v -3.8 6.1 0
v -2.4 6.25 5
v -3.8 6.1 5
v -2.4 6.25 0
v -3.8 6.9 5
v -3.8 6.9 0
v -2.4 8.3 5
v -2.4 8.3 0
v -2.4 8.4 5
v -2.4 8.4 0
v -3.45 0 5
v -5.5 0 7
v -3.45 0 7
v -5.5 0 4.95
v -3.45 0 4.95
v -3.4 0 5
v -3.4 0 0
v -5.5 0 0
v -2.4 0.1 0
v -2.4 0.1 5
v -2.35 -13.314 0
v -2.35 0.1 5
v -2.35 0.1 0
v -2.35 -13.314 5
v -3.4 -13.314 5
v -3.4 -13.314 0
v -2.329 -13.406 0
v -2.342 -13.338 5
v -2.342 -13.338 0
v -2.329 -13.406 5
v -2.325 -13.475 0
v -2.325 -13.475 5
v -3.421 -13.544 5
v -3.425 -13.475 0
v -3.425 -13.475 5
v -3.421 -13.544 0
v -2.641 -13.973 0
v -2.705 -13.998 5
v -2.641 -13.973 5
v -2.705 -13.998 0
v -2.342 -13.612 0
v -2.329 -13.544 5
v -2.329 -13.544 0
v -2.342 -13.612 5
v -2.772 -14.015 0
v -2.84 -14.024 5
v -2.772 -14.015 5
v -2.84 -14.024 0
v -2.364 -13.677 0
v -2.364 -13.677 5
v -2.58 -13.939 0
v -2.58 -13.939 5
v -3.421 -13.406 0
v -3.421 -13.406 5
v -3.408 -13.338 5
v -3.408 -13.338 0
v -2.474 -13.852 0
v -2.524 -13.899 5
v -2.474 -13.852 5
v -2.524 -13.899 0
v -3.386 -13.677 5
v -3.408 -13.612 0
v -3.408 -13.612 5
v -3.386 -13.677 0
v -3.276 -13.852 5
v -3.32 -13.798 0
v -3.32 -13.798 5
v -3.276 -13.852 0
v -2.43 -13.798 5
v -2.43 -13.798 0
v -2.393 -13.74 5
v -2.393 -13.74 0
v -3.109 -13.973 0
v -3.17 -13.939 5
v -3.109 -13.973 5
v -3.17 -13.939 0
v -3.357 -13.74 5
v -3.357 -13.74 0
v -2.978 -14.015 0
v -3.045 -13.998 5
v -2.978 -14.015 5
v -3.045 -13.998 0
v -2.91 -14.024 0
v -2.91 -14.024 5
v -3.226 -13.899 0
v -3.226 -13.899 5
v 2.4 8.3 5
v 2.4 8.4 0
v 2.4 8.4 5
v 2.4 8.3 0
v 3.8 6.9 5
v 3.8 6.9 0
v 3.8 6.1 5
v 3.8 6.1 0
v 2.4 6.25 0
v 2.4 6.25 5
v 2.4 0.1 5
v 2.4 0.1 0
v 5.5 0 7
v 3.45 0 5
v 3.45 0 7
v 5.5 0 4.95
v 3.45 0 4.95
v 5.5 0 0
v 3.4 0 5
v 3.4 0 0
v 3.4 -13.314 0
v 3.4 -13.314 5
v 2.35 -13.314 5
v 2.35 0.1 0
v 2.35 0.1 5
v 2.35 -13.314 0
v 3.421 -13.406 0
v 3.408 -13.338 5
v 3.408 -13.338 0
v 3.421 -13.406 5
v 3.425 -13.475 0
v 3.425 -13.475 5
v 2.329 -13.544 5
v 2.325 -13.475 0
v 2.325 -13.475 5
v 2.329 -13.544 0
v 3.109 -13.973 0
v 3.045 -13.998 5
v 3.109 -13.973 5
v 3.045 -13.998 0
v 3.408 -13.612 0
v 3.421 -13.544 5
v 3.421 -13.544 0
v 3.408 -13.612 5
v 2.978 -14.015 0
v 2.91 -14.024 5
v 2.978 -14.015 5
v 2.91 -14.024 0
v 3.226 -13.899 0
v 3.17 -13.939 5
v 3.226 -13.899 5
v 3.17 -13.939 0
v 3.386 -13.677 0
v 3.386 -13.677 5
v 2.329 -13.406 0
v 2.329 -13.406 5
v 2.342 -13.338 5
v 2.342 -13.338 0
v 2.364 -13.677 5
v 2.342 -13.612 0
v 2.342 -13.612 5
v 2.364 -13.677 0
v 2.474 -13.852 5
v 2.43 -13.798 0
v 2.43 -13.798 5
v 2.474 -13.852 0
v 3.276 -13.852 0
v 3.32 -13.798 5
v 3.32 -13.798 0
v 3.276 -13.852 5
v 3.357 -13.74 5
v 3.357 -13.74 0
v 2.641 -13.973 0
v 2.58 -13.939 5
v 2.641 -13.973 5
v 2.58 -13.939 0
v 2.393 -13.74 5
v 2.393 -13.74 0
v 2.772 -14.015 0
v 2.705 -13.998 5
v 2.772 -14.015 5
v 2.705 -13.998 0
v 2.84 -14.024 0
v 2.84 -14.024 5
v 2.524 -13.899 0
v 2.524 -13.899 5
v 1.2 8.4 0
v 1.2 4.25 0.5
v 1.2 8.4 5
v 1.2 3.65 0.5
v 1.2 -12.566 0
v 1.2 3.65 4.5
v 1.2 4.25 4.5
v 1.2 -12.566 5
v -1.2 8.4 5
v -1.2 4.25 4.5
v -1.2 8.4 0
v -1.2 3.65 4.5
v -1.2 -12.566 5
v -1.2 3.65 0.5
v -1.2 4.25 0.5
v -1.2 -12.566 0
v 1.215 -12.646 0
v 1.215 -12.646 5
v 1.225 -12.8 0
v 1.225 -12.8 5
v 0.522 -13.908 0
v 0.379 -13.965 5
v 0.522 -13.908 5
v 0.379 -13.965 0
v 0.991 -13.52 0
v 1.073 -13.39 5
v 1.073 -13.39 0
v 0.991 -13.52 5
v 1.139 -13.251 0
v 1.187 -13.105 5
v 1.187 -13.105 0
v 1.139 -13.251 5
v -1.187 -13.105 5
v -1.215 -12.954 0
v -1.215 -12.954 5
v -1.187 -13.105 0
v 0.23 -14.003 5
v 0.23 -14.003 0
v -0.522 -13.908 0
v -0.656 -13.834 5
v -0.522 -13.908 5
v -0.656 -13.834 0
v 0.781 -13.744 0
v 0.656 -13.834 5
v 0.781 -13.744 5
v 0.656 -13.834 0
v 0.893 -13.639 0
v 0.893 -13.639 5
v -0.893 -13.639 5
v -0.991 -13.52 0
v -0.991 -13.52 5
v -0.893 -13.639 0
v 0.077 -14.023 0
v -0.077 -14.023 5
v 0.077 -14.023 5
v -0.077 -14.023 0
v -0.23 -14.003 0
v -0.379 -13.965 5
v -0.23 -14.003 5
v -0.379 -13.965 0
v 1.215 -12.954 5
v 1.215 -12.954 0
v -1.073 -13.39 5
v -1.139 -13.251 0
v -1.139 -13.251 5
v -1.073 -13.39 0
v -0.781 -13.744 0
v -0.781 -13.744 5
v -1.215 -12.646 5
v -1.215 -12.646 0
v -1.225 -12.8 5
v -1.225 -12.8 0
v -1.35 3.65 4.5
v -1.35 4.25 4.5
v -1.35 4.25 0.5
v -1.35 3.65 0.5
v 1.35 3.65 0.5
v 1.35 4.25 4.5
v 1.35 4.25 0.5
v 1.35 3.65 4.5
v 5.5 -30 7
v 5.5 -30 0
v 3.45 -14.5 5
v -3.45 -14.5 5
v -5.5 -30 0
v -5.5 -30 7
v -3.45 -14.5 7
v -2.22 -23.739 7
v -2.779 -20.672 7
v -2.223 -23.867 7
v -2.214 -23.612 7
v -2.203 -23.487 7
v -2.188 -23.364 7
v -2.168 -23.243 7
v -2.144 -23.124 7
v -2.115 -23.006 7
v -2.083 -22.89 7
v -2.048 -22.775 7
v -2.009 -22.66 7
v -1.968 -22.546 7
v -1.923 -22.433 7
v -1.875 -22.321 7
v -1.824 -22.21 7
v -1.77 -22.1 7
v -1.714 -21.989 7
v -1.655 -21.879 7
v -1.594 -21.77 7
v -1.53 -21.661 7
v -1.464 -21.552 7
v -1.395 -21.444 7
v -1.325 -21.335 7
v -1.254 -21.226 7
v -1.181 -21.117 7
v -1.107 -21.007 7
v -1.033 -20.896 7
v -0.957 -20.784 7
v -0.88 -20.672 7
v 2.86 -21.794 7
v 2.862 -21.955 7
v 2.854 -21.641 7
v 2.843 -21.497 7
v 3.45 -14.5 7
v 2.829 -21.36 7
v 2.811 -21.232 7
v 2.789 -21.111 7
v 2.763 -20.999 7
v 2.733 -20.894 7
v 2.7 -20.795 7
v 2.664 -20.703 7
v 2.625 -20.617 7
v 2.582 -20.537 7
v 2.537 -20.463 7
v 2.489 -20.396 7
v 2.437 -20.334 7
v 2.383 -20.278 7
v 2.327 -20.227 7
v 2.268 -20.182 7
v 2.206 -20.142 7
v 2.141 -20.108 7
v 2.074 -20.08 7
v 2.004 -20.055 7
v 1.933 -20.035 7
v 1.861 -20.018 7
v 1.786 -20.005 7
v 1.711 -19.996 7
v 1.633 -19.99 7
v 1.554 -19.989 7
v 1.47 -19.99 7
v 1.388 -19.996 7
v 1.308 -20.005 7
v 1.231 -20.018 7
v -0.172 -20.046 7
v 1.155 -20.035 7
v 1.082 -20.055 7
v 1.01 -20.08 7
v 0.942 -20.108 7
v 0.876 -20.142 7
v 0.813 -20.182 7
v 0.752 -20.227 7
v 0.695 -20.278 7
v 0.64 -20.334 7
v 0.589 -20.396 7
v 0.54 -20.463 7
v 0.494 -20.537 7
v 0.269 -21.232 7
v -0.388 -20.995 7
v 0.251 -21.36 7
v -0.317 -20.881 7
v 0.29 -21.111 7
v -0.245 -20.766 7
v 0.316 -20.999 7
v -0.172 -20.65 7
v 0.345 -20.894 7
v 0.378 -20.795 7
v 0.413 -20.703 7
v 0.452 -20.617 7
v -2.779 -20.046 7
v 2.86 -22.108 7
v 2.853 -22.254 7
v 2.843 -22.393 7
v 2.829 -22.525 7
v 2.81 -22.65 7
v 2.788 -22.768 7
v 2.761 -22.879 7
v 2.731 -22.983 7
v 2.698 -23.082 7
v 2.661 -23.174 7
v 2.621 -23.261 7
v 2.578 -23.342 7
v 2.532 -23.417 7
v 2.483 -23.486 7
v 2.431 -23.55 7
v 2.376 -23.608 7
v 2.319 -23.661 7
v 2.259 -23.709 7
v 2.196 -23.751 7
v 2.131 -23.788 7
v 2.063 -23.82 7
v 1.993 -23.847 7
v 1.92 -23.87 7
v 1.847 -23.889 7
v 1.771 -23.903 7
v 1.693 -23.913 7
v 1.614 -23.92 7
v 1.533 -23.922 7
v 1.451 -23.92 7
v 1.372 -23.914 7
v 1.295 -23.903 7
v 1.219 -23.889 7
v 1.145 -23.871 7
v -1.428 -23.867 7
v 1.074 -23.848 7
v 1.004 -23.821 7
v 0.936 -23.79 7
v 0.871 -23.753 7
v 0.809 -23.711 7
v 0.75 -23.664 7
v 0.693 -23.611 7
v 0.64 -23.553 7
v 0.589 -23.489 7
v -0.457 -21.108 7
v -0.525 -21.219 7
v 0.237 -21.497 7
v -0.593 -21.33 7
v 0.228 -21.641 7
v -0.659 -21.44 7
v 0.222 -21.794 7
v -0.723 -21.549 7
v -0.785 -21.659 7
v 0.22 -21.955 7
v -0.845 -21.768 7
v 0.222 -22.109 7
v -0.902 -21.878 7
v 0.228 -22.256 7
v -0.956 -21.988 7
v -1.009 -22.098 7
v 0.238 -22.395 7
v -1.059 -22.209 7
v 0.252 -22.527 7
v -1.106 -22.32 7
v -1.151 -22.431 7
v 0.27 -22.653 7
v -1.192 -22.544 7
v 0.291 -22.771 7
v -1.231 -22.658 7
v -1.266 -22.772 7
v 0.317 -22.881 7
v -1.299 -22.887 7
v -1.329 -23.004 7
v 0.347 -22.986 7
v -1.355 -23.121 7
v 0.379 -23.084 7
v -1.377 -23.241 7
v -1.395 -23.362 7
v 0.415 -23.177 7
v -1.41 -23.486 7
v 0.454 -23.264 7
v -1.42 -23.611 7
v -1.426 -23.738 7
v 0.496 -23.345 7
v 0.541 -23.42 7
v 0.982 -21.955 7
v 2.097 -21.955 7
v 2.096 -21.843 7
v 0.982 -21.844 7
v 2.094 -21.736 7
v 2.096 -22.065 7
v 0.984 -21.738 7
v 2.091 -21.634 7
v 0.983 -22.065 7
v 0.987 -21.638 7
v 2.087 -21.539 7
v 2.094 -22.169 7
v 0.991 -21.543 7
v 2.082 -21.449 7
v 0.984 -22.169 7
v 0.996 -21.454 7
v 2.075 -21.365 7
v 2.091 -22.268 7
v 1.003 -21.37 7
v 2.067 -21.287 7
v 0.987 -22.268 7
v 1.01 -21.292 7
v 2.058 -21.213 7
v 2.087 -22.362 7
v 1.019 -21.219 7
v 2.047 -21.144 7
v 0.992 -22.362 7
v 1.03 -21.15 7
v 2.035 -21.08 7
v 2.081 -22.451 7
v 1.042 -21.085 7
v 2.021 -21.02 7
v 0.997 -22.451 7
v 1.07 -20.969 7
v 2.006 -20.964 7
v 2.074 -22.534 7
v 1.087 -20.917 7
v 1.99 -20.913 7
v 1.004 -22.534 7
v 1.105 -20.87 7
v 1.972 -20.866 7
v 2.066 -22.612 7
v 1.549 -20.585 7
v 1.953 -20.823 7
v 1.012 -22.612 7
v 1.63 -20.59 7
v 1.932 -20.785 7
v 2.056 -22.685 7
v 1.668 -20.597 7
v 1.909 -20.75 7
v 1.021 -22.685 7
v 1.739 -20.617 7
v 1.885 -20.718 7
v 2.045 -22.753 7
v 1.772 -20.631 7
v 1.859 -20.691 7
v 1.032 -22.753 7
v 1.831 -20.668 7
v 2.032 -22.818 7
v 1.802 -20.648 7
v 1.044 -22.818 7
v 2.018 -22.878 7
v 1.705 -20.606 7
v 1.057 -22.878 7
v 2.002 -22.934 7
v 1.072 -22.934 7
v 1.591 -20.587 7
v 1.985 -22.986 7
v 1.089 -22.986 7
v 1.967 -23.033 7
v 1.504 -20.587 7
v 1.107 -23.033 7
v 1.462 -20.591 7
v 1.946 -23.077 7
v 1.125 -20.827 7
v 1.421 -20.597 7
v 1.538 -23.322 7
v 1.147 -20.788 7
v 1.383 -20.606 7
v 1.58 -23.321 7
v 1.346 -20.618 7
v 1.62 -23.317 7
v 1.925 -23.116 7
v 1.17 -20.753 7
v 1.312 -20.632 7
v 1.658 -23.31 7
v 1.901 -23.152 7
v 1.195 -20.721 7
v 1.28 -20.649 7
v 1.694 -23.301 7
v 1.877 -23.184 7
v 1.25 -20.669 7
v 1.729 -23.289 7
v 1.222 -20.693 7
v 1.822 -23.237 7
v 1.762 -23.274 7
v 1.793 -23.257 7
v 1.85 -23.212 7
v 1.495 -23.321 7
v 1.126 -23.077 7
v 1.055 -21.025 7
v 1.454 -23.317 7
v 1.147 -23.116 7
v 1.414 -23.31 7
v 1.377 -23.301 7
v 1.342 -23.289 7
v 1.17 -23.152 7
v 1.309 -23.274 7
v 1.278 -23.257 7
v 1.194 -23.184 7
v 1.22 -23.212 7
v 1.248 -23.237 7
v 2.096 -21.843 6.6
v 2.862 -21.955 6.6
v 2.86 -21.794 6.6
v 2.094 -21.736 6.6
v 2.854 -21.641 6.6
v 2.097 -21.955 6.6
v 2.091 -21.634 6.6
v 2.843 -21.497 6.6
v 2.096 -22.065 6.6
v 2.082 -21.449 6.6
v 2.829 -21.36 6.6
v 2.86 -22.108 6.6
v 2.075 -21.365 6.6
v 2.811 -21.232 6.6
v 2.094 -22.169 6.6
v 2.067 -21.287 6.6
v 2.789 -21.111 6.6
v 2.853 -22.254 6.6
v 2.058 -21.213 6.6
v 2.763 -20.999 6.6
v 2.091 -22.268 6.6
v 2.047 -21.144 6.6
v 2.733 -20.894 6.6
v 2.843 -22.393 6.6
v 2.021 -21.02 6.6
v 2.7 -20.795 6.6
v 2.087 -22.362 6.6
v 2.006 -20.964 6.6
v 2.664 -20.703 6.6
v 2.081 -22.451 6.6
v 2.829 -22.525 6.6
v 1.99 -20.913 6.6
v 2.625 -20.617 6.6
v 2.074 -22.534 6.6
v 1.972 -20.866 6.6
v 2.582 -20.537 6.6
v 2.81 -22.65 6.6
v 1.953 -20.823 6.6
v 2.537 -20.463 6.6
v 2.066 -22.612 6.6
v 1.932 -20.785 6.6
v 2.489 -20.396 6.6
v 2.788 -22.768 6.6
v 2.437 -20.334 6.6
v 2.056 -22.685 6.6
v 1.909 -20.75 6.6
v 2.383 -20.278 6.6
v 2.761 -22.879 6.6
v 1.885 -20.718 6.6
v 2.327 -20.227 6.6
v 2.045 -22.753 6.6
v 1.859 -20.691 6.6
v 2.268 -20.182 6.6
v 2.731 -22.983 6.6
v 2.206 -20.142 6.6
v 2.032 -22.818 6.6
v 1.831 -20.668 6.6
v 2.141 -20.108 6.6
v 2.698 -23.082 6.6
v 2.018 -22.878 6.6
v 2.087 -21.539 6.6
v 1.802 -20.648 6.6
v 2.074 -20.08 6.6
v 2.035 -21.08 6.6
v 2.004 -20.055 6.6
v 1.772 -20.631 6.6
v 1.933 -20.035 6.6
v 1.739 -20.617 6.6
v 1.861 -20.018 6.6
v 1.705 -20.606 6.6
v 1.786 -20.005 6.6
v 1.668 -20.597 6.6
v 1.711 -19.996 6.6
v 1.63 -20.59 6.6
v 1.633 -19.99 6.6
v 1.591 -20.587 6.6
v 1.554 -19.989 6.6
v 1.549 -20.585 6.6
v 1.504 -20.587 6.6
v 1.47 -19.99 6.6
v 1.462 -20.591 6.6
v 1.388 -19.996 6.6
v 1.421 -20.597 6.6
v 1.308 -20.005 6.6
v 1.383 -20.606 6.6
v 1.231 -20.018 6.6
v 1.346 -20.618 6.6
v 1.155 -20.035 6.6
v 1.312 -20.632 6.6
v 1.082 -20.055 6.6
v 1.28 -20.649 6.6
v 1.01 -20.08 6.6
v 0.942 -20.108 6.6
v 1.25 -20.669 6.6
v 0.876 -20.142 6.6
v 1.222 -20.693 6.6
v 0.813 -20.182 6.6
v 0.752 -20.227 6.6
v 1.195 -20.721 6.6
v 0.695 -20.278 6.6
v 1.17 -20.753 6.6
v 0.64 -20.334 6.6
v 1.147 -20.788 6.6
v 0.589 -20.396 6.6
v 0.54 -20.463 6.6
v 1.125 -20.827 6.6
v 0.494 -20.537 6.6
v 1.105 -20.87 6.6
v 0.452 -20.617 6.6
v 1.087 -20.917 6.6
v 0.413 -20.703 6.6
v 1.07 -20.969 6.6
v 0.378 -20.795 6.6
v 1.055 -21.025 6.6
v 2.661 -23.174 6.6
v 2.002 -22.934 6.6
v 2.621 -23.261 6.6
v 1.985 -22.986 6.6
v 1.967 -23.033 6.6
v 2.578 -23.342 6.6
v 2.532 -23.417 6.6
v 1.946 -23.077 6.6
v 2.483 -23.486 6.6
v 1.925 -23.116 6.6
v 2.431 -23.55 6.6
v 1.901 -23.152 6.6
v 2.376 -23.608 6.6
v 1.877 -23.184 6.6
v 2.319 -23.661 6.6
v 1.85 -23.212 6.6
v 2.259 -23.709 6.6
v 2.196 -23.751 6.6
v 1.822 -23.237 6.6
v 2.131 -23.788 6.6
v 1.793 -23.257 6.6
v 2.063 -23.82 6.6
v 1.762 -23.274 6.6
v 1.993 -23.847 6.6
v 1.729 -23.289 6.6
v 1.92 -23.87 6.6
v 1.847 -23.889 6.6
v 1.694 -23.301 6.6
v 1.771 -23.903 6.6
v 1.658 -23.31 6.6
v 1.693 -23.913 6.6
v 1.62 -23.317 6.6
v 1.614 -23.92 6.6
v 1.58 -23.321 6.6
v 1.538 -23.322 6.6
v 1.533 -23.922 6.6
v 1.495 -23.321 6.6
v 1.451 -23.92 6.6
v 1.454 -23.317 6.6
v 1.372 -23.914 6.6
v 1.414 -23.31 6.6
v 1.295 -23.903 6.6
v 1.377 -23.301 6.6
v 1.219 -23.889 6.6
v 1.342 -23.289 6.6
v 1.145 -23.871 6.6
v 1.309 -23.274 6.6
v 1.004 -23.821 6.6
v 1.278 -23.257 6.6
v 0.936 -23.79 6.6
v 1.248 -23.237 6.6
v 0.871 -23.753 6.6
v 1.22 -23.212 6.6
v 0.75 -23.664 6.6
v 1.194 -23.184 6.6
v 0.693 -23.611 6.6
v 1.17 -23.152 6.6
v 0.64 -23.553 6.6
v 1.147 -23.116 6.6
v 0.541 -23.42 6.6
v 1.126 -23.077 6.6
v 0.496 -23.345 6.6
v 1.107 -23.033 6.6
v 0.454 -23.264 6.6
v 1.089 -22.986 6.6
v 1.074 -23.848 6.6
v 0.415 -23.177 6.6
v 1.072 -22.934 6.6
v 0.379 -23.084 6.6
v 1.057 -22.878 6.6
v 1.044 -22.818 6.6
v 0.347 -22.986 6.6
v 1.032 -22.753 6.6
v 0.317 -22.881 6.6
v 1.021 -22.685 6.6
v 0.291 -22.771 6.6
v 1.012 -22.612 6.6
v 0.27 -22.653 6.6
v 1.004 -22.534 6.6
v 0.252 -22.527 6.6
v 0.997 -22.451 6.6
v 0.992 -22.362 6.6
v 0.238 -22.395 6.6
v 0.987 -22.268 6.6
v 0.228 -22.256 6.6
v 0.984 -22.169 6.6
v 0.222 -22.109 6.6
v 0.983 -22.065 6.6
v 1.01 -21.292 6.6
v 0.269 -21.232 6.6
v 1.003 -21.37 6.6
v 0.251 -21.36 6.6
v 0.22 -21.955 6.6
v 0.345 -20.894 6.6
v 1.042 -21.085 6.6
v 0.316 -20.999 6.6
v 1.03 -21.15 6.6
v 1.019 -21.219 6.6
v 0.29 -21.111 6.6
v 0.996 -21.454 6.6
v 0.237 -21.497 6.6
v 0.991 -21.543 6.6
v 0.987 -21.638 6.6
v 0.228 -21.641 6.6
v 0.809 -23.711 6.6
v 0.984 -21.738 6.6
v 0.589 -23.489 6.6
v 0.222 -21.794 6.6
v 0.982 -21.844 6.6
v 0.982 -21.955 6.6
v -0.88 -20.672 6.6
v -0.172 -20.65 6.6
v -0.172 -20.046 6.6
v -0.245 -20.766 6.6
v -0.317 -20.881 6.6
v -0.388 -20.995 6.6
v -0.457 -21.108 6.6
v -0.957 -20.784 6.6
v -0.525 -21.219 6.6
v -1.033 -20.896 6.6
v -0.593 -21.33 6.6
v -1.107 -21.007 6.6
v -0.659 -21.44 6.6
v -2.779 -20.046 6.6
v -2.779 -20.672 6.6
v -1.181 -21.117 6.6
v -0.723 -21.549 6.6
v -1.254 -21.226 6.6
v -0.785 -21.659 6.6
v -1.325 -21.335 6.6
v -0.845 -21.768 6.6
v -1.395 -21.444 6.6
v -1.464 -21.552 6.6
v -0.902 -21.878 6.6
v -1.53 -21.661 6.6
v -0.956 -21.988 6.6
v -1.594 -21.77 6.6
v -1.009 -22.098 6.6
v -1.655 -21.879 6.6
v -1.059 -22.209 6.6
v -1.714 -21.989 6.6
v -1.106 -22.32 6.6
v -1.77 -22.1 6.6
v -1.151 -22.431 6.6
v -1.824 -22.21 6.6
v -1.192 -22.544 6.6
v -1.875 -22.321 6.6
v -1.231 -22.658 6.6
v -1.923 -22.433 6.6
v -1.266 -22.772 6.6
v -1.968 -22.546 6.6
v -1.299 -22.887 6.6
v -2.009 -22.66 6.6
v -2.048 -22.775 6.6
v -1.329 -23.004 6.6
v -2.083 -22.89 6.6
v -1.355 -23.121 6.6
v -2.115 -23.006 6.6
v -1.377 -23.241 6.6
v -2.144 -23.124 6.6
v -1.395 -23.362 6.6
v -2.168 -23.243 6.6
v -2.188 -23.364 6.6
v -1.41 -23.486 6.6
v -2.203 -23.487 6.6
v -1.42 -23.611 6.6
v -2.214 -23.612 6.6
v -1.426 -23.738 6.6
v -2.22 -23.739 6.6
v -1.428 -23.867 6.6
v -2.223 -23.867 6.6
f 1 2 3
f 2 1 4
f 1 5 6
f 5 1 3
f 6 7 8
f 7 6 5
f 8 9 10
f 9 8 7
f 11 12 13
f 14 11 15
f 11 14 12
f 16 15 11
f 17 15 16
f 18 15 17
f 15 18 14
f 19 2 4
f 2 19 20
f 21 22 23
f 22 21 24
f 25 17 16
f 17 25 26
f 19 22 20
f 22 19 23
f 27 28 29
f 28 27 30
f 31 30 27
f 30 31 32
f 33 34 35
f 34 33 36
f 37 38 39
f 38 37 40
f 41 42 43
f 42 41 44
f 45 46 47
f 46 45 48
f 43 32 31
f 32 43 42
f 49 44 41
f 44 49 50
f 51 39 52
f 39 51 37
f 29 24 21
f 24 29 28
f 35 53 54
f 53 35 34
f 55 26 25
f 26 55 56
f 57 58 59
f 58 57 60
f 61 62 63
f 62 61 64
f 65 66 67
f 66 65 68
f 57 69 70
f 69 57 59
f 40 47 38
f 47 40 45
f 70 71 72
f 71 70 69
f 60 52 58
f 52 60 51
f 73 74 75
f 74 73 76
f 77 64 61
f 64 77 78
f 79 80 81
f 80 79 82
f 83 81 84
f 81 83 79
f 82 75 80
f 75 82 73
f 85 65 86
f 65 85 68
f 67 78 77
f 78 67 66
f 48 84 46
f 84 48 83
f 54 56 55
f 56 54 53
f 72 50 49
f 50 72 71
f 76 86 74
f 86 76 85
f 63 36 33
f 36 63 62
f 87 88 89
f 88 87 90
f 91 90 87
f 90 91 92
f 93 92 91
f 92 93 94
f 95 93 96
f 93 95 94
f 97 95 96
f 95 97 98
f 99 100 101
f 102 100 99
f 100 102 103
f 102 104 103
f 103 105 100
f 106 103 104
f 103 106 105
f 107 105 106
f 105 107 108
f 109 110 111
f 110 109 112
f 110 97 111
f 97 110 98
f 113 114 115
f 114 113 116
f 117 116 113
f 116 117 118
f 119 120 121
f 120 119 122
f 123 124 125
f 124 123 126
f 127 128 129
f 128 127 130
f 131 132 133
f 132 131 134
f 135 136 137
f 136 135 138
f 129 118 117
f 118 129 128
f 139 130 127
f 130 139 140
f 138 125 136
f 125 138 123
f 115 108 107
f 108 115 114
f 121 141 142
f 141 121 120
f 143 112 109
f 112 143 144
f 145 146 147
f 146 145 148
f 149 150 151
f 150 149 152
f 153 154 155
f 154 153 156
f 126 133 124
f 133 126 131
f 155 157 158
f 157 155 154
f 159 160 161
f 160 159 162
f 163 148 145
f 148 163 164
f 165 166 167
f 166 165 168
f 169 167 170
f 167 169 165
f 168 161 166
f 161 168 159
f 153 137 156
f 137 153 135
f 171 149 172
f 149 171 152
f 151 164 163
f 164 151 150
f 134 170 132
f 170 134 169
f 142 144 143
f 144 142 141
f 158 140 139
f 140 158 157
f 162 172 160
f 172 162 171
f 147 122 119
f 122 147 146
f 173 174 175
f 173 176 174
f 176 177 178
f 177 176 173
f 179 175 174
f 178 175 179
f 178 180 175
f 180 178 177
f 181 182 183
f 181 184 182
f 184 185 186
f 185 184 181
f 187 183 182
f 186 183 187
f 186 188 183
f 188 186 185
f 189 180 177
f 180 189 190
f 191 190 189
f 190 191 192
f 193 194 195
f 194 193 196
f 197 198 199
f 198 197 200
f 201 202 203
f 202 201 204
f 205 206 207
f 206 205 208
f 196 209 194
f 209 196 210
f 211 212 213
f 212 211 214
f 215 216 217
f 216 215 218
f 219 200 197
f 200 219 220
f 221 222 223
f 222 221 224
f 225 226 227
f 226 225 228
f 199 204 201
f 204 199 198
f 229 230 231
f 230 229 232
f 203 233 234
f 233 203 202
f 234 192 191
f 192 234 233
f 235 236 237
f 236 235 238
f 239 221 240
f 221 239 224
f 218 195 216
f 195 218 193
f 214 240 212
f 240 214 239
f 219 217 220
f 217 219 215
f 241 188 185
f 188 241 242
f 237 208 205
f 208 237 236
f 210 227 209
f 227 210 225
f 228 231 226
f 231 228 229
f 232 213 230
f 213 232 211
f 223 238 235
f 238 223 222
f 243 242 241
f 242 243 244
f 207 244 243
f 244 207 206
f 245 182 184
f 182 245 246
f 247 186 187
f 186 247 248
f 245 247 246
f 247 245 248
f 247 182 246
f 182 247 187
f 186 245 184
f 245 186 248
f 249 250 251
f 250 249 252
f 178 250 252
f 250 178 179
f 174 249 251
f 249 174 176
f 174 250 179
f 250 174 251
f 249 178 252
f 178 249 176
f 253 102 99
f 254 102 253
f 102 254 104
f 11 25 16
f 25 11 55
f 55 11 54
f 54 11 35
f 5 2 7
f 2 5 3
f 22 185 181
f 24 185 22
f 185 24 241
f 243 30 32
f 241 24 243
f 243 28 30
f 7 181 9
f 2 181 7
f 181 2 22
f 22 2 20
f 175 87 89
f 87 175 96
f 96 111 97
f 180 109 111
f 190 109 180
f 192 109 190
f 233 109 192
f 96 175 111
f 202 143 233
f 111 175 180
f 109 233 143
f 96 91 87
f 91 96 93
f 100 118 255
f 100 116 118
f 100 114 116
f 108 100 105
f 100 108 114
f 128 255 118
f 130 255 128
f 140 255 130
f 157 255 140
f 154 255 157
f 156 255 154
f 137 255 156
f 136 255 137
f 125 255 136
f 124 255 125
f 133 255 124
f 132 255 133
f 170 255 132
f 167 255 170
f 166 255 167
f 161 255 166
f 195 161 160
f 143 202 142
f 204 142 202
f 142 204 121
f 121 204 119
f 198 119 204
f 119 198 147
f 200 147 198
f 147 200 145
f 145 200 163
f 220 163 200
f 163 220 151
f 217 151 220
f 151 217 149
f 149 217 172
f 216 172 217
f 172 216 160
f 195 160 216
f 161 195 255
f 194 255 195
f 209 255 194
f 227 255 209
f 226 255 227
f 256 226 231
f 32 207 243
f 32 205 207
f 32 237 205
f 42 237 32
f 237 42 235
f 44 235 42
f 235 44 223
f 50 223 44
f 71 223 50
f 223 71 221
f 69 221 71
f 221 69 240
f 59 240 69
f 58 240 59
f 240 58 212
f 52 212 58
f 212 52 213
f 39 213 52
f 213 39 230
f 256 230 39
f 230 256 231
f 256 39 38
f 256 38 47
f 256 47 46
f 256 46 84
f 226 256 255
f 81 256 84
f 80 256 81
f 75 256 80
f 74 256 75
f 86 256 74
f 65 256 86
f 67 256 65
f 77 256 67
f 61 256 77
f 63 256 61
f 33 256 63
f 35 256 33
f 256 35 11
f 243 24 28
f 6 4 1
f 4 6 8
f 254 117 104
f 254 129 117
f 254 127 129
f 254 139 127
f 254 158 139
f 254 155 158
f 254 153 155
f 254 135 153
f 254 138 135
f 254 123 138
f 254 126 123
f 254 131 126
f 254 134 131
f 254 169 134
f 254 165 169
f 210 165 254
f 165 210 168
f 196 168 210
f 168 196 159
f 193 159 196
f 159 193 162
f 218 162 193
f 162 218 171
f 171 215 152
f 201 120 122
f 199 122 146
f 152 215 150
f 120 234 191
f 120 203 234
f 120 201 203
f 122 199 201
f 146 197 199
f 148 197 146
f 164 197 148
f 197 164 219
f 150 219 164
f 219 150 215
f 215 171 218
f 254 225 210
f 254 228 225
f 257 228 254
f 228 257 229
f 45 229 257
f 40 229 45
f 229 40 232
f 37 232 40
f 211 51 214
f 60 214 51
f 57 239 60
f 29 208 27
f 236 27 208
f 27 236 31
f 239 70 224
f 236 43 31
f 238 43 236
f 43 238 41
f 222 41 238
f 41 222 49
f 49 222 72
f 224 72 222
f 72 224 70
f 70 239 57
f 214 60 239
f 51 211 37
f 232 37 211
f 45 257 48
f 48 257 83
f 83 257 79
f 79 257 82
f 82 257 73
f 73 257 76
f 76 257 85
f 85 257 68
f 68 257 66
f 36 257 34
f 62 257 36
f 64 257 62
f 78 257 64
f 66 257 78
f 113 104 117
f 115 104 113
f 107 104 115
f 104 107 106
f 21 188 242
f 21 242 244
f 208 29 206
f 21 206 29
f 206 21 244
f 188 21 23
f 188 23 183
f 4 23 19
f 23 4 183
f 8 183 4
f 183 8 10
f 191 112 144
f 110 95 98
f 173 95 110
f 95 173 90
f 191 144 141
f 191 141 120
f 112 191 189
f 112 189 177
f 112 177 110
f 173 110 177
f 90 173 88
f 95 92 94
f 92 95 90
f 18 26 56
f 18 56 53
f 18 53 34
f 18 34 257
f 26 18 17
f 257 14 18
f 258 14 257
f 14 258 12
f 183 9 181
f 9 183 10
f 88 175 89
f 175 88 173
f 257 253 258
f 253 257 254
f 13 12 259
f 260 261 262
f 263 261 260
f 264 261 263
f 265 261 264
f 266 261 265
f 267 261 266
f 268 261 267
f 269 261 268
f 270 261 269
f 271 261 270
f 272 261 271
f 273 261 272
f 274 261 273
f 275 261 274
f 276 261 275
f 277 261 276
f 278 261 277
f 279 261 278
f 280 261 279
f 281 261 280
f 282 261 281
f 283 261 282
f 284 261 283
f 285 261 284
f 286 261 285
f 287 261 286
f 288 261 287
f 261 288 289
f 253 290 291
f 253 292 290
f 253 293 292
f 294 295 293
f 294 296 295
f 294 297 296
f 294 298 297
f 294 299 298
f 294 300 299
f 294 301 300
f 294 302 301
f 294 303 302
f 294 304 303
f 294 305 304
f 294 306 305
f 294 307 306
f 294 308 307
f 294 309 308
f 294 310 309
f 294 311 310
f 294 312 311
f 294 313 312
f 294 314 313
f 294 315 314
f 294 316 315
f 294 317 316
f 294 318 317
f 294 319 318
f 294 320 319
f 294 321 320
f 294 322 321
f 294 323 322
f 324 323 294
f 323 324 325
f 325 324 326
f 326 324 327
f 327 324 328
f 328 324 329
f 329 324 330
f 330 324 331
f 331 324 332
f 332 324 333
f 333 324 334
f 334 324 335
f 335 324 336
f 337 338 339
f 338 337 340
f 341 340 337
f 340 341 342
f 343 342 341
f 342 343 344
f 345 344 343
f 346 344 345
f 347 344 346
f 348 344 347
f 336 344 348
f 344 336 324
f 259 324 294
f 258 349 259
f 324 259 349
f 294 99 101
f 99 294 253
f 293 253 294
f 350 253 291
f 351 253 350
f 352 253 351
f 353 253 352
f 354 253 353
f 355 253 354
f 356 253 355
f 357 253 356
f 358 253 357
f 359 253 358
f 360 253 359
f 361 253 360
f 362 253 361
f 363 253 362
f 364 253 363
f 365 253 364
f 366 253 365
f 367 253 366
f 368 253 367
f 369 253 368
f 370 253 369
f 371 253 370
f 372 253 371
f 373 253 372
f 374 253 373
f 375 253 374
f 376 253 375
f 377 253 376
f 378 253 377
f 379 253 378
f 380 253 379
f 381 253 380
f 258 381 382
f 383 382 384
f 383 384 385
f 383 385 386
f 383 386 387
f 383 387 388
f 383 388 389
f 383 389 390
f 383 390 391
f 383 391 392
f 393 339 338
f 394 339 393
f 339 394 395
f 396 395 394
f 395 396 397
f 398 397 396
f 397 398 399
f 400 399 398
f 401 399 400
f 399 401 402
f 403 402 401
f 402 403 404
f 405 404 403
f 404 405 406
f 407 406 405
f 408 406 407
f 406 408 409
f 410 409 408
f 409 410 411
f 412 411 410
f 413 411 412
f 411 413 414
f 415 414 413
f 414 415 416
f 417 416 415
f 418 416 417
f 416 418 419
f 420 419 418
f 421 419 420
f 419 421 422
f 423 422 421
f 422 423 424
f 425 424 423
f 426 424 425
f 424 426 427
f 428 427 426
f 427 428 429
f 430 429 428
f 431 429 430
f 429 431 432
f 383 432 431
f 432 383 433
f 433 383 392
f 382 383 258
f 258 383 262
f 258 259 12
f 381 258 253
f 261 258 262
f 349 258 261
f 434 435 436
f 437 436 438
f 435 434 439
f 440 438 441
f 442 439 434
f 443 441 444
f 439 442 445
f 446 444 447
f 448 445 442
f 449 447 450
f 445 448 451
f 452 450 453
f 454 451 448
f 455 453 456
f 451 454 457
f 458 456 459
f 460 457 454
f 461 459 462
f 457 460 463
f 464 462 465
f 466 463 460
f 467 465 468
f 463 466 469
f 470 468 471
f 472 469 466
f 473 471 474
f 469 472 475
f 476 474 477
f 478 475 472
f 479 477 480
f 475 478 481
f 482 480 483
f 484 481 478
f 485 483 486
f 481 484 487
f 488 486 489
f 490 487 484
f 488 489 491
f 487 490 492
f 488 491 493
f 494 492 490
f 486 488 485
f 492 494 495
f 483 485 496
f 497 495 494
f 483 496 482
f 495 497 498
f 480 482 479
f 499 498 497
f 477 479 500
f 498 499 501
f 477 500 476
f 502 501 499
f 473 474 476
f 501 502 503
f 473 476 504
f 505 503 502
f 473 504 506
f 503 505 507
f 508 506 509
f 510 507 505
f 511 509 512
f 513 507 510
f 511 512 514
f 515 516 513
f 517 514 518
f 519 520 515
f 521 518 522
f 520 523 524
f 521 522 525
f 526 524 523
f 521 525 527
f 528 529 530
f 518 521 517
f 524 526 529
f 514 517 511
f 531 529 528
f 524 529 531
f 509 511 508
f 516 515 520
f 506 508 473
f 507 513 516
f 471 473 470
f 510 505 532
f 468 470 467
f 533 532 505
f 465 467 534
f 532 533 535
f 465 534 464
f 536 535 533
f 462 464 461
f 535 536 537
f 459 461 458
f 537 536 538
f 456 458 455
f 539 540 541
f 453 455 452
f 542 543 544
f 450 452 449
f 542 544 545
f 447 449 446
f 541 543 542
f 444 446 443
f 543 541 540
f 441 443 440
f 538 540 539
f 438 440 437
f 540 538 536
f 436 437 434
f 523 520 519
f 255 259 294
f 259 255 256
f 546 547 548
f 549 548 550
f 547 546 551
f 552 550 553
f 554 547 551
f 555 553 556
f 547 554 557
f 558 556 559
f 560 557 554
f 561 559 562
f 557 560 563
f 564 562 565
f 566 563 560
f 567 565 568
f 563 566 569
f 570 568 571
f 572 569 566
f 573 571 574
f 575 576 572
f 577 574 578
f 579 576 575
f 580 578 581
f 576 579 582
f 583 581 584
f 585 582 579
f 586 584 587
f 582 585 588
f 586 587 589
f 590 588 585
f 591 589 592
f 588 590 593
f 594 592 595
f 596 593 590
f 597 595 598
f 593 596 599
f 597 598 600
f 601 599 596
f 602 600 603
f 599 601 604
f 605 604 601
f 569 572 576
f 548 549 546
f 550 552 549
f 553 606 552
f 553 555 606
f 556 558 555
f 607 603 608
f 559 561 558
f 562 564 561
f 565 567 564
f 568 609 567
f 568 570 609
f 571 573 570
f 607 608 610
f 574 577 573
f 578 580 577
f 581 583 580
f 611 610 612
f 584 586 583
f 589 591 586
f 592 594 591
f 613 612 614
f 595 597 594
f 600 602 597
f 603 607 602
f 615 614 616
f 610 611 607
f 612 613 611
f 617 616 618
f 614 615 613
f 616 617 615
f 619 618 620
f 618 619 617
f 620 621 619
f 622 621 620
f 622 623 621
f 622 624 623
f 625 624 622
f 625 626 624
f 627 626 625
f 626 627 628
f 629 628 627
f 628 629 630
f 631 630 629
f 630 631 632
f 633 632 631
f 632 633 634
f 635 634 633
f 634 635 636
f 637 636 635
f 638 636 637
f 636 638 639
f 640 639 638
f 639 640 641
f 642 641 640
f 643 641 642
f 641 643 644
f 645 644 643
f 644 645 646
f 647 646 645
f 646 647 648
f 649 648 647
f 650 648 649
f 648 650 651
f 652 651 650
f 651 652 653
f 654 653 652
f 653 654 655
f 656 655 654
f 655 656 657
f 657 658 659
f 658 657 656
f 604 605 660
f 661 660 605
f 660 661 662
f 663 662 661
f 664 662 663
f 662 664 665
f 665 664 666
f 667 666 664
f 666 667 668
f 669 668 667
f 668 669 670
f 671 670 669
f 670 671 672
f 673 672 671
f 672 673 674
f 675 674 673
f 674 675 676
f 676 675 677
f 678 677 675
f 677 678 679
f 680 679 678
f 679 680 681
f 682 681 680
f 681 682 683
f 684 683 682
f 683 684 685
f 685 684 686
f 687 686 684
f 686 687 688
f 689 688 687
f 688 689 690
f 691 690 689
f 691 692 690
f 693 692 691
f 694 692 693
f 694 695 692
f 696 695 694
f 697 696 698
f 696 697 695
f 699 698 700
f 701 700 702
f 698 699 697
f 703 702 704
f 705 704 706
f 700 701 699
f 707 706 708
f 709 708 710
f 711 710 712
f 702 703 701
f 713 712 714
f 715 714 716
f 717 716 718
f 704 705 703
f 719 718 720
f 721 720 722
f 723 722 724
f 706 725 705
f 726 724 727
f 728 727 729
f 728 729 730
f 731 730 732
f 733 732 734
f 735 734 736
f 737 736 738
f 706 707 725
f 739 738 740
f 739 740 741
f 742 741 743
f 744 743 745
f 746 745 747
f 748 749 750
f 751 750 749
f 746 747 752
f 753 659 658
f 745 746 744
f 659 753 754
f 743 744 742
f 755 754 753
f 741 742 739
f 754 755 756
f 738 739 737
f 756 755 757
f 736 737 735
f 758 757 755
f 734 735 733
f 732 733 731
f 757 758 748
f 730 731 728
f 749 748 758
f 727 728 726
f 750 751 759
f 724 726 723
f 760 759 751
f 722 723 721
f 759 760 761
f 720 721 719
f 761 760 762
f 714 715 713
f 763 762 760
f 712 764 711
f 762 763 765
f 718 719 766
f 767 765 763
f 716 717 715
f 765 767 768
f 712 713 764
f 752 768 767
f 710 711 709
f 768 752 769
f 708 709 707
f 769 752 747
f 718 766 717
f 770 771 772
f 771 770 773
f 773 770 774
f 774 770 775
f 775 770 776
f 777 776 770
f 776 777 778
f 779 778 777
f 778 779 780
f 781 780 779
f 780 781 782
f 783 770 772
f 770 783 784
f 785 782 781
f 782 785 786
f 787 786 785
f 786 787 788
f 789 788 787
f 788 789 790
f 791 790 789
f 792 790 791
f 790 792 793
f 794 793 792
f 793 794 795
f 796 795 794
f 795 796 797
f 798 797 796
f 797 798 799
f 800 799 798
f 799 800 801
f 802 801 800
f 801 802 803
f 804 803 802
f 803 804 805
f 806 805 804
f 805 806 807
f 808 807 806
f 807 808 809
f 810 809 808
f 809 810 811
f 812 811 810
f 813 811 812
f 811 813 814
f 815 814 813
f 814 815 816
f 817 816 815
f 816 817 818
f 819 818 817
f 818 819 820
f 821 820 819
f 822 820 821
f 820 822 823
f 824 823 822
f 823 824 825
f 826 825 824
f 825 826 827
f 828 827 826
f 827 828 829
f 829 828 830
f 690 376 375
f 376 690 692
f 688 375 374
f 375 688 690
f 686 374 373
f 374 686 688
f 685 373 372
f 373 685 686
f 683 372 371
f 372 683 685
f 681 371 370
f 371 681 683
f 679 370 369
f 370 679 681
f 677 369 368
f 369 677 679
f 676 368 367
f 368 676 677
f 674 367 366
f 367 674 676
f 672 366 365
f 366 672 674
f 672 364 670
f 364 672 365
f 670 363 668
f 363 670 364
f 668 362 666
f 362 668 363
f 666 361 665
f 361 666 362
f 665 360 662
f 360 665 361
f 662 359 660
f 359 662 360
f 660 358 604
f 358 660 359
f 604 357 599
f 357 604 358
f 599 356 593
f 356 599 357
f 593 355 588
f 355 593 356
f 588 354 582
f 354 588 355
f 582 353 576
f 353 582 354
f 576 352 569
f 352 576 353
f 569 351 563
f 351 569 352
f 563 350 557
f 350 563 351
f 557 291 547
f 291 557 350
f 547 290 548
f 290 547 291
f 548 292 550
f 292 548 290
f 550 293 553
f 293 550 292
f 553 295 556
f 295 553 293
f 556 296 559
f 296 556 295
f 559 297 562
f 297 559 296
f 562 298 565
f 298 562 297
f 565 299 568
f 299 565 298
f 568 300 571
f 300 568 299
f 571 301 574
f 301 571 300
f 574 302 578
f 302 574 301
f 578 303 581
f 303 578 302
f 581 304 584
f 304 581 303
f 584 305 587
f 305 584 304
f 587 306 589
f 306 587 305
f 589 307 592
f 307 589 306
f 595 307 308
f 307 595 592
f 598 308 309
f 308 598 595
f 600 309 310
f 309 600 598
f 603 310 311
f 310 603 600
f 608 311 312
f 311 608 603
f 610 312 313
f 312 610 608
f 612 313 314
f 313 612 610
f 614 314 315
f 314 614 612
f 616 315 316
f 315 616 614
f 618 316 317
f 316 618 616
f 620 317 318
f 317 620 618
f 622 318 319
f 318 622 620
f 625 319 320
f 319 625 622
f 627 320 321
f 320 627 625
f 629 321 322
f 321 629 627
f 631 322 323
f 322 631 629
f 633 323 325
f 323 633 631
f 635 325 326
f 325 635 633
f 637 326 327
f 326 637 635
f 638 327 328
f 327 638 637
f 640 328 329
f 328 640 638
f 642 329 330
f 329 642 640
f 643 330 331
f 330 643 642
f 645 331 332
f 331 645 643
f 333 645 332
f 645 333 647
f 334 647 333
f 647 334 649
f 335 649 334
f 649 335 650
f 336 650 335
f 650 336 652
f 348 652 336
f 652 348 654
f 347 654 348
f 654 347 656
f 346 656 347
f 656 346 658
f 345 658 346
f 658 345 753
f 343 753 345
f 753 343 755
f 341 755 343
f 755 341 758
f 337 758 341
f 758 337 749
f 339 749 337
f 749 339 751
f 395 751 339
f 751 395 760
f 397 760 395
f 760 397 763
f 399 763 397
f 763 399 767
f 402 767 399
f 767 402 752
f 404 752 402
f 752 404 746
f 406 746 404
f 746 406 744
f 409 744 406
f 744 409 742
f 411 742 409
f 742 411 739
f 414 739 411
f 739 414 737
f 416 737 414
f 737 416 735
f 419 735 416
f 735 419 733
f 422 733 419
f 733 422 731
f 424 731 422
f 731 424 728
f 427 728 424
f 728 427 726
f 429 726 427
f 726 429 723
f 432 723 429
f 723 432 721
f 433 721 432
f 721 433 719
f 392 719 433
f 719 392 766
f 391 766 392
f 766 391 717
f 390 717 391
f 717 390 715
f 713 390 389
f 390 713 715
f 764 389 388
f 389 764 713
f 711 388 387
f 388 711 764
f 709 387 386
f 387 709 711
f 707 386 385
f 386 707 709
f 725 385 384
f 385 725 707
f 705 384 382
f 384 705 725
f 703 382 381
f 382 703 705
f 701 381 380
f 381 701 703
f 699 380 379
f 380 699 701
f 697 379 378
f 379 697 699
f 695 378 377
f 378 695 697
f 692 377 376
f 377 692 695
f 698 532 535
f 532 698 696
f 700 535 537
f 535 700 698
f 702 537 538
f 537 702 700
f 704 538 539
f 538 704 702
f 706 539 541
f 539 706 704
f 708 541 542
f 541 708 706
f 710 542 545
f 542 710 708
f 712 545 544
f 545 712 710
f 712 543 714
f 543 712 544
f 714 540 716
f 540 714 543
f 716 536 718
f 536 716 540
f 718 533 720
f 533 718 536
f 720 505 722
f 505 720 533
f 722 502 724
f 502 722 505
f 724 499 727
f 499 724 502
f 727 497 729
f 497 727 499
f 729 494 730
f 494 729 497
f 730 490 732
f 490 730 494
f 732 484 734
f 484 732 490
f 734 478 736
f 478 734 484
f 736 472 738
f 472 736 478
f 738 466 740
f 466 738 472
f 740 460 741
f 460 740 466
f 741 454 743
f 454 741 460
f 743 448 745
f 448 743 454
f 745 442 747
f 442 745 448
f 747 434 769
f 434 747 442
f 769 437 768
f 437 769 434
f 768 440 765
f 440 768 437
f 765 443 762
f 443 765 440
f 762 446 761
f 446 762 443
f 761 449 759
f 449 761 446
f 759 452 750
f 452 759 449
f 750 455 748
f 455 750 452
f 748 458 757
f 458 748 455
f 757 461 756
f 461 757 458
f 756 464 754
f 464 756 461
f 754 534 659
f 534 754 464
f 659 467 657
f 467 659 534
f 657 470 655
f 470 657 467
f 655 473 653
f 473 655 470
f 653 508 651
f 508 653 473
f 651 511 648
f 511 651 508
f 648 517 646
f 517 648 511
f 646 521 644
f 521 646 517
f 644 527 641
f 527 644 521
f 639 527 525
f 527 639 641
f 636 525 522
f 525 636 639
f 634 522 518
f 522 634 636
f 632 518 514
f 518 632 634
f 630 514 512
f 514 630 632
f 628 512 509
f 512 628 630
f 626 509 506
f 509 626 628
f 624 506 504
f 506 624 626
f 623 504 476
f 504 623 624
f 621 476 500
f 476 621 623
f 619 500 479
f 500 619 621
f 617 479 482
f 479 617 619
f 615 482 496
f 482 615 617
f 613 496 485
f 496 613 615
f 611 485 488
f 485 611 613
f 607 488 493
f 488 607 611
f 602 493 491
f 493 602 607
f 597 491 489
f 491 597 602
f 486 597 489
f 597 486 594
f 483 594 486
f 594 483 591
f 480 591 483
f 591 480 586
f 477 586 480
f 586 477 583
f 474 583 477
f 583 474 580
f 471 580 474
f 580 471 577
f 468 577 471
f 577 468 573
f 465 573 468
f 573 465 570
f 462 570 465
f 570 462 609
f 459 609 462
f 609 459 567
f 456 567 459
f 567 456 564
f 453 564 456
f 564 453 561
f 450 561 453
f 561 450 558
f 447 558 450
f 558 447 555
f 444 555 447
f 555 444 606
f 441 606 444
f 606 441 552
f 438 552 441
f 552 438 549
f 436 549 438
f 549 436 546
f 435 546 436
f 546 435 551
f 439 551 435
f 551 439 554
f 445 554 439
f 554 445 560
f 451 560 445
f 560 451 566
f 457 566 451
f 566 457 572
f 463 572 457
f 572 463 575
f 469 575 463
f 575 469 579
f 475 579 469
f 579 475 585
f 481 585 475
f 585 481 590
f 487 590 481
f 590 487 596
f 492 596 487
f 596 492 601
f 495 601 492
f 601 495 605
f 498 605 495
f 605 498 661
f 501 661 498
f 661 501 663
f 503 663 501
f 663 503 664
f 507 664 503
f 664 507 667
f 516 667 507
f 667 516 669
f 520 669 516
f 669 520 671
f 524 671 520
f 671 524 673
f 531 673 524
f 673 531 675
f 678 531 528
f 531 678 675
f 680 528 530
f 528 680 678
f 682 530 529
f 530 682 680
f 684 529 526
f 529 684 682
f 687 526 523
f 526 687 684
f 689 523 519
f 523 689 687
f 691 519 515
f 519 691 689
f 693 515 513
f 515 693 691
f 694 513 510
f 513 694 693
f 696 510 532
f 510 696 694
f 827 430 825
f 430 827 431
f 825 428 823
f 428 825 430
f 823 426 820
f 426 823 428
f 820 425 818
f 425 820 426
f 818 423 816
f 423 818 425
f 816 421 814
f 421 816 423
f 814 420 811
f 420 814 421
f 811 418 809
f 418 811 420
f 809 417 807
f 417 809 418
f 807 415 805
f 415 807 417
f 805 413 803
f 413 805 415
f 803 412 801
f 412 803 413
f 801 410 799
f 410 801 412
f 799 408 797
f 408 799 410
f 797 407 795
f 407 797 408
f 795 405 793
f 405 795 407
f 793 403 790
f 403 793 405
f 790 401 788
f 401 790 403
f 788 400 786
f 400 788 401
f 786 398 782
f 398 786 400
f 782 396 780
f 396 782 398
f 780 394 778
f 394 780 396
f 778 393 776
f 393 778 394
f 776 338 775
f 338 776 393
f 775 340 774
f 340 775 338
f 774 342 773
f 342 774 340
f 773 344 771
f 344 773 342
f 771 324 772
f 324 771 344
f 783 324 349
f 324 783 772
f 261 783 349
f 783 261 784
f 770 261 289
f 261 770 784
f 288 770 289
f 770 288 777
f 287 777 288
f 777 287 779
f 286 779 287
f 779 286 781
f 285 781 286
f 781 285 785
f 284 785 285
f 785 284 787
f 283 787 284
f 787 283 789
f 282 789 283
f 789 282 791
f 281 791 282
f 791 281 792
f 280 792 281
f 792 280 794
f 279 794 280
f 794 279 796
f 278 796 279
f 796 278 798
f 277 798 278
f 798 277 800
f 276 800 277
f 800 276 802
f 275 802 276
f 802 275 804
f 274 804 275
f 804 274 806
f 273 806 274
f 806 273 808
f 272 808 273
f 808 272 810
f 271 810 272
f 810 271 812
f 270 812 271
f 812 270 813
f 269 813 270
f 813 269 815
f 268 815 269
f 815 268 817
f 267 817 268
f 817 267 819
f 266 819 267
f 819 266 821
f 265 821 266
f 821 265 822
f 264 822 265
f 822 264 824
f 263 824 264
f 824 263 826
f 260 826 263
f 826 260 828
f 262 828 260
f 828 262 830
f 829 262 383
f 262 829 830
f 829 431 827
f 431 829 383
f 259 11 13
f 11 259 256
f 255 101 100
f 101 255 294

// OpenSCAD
$fn = 50;

difference() {
	union() {
		translate(v = [0, 0, 0]) {
			rotate(a = [0, 0, 0]) {
				difference() {
					union() {
						translate(v = [0, 0, 0]) {
							rotate(a = [0, 0, 0]) {
								difference() {
									union() {
										translate(v = [-5.5, -30.0, 0]) {
											cube(size = [11.0, 38.4, 5.0]);
										}
									}
									union() {
										translate(v = [0, 0, -0.1]) {
											linear_extrude(height = 5.2) {
												polygon(points = [[-2.4, 0], [-2.4, 6.25], [-3.8, 6.1], [-3.8, 6.8999999999999995], [-2.4, 8.299999999999999], [-2.4, 9.399999999999999], [-5.7, 9.399999999999999], [-5.7, 0]]);
											}
										}
										translate(v = [0, 0, -0.1]) {
											linear_extrude(height = 5.2) {
												polygon(points = [[-2.35, -13.5], [-2.35, -13.1625], [-2.35, -12.825], [-2.35, -12.4875], [-2.35, -12.15], [-2.35, -11.8125], [-2.35, -11.475], [-2.35, -11.1375], [-2.35, -10.8], [-2.35, -10.4625], [-2.35, -10.125], [-2.35, -9.7875], [-2.35, -9.45], [-2.35, -9.1125], [-2.35, -8.775], [-2.35, -8.4375], [-2.35, -8.1], [-2.35, -7.7625], [-2.35, -7.425], [-2.35, -7.0875], [-2.35, -6.75], [-2.35, -6.4125], [-2.35, -6.075], [-2.35, -5.7375], [-2.35, -5.4], [-2.35, -5.0625], [-2.35, -4.725], [-2.35, -4.387499999999999], [-2.35, -4.050000000000001], [-2.35, -3.7125000000000004], [-2.35, -3.375], [-2.35, -3.0374999999999996], [-2.35, -2.6999999999999993], [-2.35, -2.3625000000000007], [-2.35, -2.0250000000000004], [-2.35, -1.6875], [-2.35, -1.3499999999999996], [-2.35, -1.0124999999999993], [-2.35, -0.6750000000000007], [-2.35, -0.33750000000000036], [-2.35, 0.0], [-2.35, 0.1], [-3.4, 0.1], [-3.4, -13.5]]);
											}
										}
										translate(v = [-2.875, -13.475, -0.1]) {
											cylinder(h = 5.2, r = 0.55);
										}
										translate(v = [0, 0, -0.1]) {
											linear_extrude(height = 5.2) {
												polygon(points = [[2.4, 0], [2.4, 6.25], [3.8, 6.1], [3.8, 6.8999999999999995], [2.4, 8.299999999999999], [2.4, 9.399999999999999], [5.7, 9.399999999999999], [5.7, 0]]);
											}
										}
										translate(v = [0, 0, -0.1]) {
											linear_extrude(height = 5.2) {
												polygon(points = [[2.35, -13.5], [2.35, -13.1625], [2.35, -12.825], [2.35, -12.4875], [2.35, -12.15], [2.35, -11.8125], [2.35, -11.475], [2.35, -11.1375], [2.35, -10.8], [2.35, -10.4625], [2.35, -10.125], [2.35, -9.7875], [2.35, -9.45], [2.35, -9.1125], [2.35, -8.775], [2.35, -8.4375], [2.35, -8.1], [2.35, -7.7625], [2.35, -7.425], [2.35, -7.0875], [2.35, -6.75], [2.35, -6.4125], [2.35, -6.075], [2.35, -5.7375], [2.35, -5.4], [2.35, -5.0625], [2.35, -4.725], [2.35, -4.387499999999999], [2.35, -4.050000000000001], [2.35, -3.7125000000000004], [2.35, -3.375], [2.35, -3.0374999999999996], [2.35, -2.6999999999999993], [2.35, -2.3625000000000007], [2.35, -2.0250000000000004], [2.35, -1.6875], [2.35, -1.3499999999999996], [2.35, -1.0124999999999993], [2.35, -0.6750000000000007], [2.35, -0.33750000000000036], [2.35, 0.0], [2.35, 0.1], [3.4, 0.1], [3.4, -13.5]]);
											}
										}
										translate(v = [2.875, -13.475, -0.1]) {
											cylinder(h = 5.2, r = 0.55);
										}
										translate(v = [0, 0, -0.1]) {
											linear_extrude(height = 5.2) {
												polygon(points = [[-1.2, -12.850000000000001], [-1.2, -12.532142857142858], [-1.2, -12.214285714285715], [-1.2, -11.896428571428572], [-1.2, -11.57857142857143], [-1.2, -11.260714285714288], [-1.2, -10.942857142857145], [-1.2, -10.625000000000002], [-1.2, -10.307142857142859], [-1.2, -9.989285714285716], [-1.2, -9.671428571428573], [-1.2, -9.35357142857143], [-1.2, -9.035714285714286], [-1.2, -8.717857142857145], [-1.2, -8.400000000000002], [-1.2, -8.082142857142859], [-1.2, -7.764285714285716], [-1.2, -7.446428571428573], [-1.2, -7.12857142857143], [-1.2, -6.810714285714287], [-1.2, -6.492857142857145], [-1.2, -6.175000000000002], [-1.2, -5.8571428571428585], [-1.2, -5.5392857142857155], [-1.2, -5.221428571428572], [-1.2, -4.90357142857143], [-1.2, -4.585714285714287], [-1.2, -4.267857142857144], [-1.2, -3.950000000000001], [-1.2, -3.632142857142858], [-1.2, -3.314285714285715], [-1.2, -2.9964285714285737], [-1.2, -2.6785714285714306], [-1.2, -2.3607142857142875], [-1.2, -2.0428571428571445], [-1.2, -1.7250000000000014], [-1.2, -1.4071428571428584], [-1.2, -1.0892857142857153], [-1.2, -0.7714285714285722], [-1.2, -0.4535714285714292], [-1.2, -0.1357142857142879], [-1.2, 0], [-1.2, 0.18214285714285516], [-1.2, 0.4999999999999982], [-1.2, 0.8178571428571413], [-1.2, 1.1357142857142843], [-1.2, 1.4535714285714274], [-1.2, 1.7714285714285705], [-1.2, 2.0892857142857135], [-1.2, 2.4071428571428566], [-1.2, 2.724999999999998], [-1.2, 3.042857142857141], [-1.2, 3.360714285714284], [-1.2, 3.678571428571427], [-1.2, 3.99642857142857], [-1.2, 4.314285714285713], [-1.2, 4.632142857142856], [-1.2, 4.949999999999999], [-1.2, 5.267857142857142], [-1.2, 5.585714285714285], [-1.2, 5.9035714285714285], [-1.2, 6.1], [-1.2, 6.2214285714285715], [-1.2, 6.25], [-1.2, 6.539285714285715], [-1.2, 6.857142857142854], [-1.2, 7.174999999999997], [-1.2, 7.49285714285714], [-1.2, 7.810714285714283], [-1.2, 8.128571428571426], [-1.2, 8.44642857142857], [-1.2, 8.764285714285712], [-1.2, 9.082142857142856], [-1.2, 9.399999999999999], [1.2, 9.399999999999999], [1.2, 9.082142857142856], [1.2, 8.764285714285712], [1.2, 8.44642857142857], [1.2, 8.128571428571426], [1.2, 7.810714285714283], [1.2, 7.49285714285714], [1.2, 7.174999999999997], [1.2, 6.857142857142854], [1.2, 6.539285714285715], [1.2, 6.25], [1.2, 6.2214285714285715], [1.2, 6.1], [1.2, 5.9035714285714285], [1.2, 5.585714285714285], [1.2, 5.267857142857142], [1.2, 4.949999999999999], [1.2, 4.632142857142856], [1.2, 4.314285714285713], [1.2, 3.99642857142857], [1.2, 3.678571428571427], [1.2, 3.360714285714284], [1.2, 3.042857142857141], [1.2, 2.724999999999998], [1.2, 2.4071428571428566], [1.2, 2.0892857142857135], [1.2, 1.7714285714285705], [1.2, 1.4535714285714274], [1.2, 1.1357142857142843], [1.2, 0.8178571428571413], [1.2, 0.4999999999999982], [1.2, 0.18214285714285516], [1.2, 0], [1.2, -0.1357142857142879], [1.2, -0.4535714285714292], [1.2, -0.7714285714285722], [1.2, -1.0892857142857153], [1.2, -1.4071428571428584], [1.2, -1.7250000000000014], [1.2, -2.0428571428571445], [1.2, -2.3607142857142875], [1.2, -2.6785714285714306], [1.2, -2.9964285714285737], [1.2, -3.314285714285715], [1.2, -3.632142857142858], [1.2, -3.950000000000001], [1.2, -4.267857142857144], [1.2, -4.585714285714287], [1.2, -4.90357142857143], [1.2, -5.221428571428572], [1.2, -5.5392857142857155], [1.2, -5.8571428571428585], [1.2, -6.175000000000002], [1.2, -6.492857142857145], [1.2, -6.810714285714287], [1.2, -7.12857142857143], [1.2, -7.446428571428573], [1.2, -7.764285714285716], [1.2, -8.082142857142859], [1.2, -8.400000000000002], [1.2, -8.717857142857145], [1.2, -9.035714285714286], [1.2, -9.35357142857143], [1.2, -9.671428571428573], [1.2, -9.989285714285716], [1.2, -10.307142857142859], [1.2, -10.625000000000002], [1.2, -10.942857142857145], [1.2, -11.260714285714288], [1.2, -11.57857142857143], [1.2, -11.896428571428572], [1.2, -12.214285714285715], [1.2, -12.532142857142858], [1.2, -12.850000000000001]]);
											}
										}
										translate(v = [0, -12.8, -0.1]) {
											cylinder(h = 5.2, r = 1.2249999999999999);
										}
										translate(v = [0, -22, 6.6]) {
											linear_extrude(height = 0.5) {
												text(font = "Arial:style=Bold", halign = "center", size = 4.0, text = "70", valign = "center");
											}
										}
										translate(v = [-1.3499999999999999, 3.65, 0.5]) {
											cube(size = [0.2, 0.6000000000000001, 4.0]);
										}
										translate(v = [1.15, 3.65, 0.5]) {
											cube(size = [0.2, 0.6000000000000001, 4.0]);
										}
									}
								}
							}
						}
						translate(v = [0, 0, 0]) {
							rotate(a = [0, 0, 0]) {
								difference() {
									union() {
										translate(v = [-5.5, -30.0, 4.95]) {
											cube(size = [11.0, 15.5, 2.05]);
										}
									}
									union() {
										translate(v = [0, -22, 6.6]) {
											linear_extrude(height = 0.5) {
												text(font = "Arial:style=Bold", halign = "center", size = 4.0, text = "70", valign = "center");
											}
										}
									}
								}
							}
						}
						translate(v = [-5.5, -30.0, 4.95]) {
							cube(size = [2.0500000000000003, 30.0, 2.05]);
						}
						translate(v = [3.4499999999999997, -30.0, 4.95]) {
							cube(size = [2.0500000000000003, 30.0, 2.05]);
						}
					}
					union();
				}
			}
		}
	}
	union();
}
